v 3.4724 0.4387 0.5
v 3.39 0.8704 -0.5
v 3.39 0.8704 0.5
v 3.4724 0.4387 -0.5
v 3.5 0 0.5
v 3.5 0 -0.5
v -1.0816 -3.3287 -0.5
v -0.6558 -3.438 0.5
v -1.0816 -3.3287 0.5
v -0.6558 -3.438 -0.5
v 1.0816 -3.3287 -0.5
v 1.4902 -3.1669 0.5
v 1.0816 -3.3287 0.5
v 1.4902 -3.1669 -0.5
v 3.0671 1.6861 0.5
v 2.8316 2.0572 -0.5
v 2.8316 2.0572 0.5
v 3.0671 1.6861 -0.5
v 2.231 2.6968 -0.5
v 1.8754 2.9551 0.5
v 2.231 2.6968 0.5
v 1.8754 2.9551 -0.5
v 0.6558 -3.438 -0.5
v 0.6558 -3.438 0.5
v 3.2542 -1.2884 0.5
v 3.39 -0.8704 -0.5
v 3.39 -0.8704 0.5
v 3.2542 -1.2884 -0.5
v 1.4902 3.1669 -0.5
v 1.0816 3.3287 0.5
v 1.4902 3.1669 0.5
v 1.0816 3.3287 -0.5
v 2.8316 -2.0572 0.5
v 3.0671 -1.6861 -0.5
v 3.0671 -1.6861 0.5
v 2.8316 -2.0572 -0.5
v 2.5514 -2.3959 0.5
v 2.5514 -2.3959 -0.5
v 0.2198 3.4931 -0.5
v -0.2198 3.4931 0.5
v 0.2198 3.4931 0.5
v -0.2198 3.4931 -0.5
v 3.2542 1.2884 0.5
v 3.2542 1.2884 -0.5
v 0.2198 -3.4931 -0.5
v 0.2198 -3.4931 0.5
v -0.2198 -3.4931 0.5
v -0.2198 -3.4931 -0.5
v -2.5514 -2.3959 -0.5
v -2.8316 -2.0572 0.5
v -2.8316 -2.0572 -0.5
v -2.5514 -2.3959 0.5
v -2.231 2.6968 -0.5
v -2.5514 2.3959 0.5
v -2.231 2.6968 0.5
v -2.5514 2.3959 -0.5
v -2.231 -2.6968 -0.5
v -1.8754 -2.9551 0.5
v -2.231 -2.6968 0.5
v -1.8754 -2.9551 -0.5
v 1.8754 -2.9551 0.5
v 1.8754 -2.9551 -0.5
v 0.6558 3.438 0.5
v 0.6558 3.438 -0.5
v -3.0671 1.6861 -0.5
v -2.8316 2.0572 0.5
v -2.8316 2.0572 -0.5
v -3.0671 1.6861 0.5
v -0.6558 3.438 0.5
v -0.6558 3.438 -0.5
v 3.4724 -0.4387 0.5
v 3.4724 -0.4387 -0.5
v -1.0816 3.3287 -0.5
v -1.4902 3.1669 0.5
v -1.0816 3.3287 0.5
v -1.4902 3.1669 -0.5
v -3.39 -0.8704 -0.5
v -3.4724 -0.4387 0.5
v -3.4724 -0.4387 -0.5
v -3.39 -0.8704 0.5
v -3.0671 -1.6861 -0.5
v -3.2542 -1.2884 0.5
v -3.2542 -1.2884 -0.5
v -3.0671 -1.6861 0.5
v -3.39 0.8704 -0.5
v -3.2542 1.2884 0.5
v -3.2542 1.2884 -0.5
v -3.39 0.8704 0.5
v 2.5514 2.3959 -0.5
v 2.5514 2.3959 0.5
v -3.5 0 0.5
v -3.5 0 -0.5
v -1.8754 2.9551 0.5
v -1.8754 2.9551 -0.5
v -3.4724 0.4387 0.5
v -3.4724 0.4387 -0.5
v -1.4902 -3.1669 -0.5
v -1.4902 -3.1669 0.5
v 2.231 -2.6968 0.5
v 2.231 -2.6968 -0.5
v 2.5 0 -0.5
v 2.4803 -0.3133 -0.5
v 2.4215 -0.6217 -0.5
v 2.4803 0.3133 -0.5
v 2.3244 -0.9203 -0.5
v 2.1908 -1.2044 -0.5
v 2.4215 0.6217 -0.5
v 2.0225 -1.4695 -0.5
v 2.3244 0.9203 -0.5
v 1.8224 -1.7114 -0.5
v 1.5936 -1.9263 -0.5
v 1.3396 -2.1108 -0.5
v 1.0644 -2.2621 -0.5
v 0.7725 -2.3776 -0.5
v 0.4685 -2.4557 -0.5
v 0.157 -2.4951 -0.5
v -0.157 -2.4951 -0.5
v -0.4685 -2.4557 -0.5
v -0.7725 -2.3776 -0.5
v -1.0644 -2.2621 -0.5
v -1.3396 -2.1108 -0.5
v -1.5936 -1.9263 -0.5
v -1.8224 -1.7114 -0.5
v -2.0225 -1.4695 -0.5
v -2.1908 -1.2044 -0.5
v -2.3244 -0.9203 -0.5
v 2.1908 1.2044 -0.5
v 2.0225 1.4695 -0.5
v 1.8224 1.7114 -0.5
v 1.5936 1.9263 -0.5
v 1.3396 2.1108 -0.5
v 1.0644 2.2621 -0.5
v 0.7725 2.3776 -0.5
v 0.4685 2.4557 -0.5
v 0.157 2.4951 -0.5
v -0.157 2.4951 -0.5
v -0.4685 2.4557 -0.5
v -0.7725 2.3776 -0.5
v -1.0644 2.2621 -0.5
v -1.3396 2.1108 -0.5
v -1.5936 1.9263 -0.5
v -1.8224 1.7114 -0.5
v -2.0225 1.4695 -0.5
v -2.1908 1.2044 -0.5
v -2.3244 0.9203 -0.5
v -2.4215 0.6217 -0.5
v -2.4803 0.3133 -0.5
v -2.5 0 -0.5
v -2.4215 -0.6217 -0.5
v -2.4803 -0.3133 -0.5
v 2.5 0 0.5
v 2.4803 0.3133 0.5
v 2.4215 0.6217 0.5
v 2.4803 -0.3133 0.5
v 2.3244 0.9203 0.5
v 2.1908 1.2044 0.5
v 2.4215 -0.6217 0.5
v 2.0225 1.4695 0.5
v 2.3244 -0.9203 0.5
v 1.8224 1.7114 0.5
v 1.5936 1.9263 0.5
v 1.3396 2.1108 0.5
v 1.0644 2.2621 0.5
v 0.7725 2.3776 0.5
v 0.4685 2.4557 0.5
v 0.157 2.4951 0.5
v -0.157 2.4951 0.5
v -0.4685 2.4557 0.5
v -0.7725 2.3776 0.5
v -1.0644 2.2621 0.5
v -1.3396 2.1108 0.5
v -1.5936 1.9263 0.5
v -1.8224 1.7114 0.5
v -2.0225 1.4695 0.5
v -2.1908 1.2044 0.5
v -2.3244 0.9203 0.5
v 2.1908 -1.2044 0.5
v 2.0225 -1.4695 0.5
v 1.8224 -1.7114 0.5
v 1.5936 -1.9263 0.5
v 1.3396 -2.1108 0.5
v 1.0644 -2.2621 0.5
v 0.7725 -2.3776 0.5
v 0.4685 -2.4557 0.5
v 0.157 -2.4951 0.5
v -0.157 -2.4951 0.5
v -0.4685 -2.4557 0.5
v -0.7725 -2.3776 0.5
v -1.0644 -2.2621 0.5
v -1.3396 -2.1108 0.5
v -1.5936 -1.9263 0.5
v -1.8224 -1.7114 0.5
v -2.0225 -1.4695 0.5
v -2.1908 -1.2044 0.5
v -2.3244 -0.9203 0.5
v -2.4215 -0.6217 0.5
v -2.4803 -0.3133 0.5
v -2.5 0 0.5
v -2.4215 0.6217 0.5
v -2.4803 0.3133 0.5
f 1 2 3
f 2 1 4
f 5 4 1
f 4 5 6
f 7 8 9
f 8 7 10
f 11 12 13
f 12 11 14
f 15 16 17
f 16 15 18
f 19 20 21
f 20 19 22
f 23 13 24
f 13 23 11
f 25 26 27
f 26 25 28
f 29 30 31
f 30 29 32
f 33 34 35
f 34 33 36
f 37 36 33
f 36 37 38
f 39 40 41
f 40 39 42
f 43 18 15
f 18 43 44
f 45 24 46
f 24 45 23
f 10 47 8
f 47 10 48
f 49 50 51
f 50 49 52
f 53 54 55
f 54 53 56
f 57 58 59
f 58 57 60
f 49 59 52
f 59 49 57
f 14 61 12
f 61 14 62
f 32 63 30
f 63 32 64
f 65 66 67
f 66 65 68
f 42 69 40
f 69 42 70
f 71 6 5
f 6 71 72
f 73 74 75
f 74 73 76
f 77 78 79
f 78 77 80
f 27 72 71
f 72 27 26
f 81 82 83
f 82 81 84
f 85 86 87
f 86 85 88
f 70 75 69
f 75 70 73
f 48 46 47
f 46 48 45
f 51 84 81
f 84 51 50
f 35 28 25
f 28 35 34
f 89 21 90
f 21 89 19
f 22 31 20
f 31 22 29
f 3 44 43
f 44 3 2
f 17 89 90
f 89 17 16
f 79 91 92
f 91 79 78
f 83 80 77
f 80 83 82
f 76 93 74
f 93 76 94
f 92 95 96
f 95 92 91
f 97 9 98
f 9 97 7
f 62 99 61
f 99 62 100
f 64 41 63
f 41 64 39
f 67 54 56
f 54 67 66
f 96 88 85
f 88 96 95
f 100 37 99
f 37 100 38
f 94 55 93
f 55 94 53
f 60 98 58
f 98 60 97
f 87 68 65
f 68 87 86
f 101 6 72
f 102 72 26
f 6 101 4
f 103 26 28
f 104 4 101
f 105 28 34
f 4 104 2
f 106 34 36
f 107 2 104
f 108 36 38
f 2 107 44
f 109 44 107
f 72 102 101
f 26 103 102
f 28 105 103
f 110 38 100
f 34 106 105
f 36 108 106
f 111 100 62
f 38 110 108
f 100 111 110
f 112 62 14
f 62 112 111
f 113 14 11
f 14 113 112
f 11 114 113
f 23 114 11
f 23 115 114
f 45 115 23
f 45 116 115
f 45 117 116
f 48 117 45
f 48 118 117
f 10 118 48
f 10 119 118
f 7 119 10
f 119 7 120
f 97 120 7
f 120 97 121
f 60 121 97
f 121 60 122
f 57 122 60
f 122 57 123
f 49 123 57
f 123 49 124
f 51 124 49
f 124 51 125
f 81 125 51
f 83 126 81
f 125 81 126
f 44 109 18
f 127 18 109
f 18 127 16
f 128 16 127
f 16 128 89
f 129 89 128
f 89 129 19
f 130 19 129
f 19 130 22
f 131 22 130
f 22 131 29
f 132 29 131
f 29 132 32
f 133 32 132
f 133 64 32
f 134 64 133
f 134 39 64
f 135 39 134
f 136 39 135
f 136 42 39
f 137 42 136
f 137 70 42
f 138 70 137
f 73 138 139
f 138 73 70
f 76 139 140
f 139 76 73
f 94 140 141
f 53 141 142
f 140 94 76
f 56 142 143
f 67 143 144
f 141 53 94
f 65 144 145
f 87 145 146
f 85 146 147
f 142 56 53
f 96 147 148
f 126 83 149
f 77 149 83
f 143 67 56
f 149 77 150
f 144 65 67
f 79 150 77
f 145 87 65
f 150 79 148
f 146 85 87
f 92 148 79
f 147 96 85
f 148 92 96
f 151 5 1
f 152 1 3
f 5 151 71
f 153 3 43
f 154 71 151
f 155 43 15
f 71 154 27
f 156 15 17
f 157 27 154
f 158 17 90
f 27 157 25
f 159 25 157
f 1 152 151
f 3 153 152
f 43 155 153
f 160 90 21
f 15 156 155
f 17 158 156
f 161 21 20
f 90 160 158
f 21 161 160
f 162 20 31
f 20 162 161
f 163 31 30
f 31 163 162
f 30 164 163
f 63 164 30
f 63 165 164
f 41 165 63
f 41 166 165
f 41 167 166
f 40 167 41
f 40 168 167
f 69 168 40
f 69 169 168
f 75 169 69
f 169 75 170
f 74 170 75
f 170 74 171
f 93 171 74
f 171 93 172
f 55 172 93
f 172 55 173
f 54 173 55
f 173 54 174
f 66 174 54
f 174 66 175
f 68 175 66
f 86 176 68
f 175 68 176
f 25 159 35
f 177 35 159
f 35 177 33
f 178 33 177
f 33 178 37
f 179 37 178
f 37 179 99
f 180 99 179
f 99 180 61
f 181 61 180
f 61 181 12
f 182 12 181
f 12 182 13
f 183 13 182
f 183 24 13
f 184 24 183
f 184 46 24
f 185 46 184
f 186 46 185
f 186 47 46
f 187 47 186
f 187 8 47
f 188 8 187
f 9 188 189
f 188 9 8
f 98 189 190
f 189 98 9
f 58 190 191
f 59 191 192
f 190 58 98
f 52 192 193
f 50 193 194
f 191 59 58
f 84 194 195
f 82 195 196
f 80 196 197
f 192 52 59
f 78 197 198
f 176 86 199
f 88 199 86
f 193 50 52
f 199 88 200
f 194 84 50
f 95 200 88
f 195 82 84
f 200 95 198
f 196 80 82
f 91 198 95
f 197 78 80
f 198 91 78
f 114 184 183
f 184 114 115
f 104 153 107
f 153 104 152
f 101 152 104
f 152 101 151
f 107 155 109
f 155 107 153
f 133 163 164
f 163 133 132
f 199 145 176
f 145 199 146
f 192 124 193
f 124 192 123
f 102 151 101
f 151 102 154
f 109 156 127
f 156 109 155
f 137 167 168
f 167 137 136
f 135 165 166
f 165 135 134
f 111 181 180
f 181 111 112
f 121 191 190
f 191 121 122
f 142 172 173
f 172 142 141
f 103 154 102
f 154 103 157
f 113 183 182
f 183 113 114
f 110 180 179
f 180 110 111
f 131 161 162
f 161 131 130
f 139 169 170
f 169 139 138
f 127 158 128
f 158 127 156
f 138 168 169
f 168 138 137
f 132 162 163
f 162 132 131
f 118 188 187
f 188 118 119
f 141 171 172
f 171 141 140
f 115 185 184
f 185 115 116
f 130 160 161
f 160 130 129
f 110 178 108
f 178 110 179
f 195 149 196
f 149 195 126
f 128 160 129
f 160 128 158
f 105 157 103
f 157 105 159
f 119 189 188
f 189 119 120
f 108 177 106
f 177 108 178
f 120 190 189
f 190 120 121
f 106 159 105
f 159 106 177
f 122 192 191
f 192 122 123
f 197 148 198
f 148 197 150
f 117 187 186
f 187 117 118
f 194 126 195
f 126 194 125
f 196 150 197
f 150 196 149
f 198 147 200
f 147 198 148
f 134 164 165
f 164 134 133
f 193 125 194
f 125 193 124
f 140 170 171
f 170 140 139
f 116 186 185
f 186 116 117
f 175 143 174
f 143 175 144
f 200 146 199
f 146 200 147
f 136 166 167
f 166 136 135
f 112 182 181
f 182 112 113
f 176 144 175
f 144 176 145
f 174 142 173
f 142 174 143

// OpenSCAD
$fn = 50;


difference() {
	union() {
		translate(v = [0, 0, -0.5000000000]) {
			cylinder(h = 1, r = 3.5000000000);
		}
	}
	union() {
		translate(v = [0, 0, -100.0000000000]) {
			cylinder(h = 200, r = 2.5000000000);
		}
	}
}
